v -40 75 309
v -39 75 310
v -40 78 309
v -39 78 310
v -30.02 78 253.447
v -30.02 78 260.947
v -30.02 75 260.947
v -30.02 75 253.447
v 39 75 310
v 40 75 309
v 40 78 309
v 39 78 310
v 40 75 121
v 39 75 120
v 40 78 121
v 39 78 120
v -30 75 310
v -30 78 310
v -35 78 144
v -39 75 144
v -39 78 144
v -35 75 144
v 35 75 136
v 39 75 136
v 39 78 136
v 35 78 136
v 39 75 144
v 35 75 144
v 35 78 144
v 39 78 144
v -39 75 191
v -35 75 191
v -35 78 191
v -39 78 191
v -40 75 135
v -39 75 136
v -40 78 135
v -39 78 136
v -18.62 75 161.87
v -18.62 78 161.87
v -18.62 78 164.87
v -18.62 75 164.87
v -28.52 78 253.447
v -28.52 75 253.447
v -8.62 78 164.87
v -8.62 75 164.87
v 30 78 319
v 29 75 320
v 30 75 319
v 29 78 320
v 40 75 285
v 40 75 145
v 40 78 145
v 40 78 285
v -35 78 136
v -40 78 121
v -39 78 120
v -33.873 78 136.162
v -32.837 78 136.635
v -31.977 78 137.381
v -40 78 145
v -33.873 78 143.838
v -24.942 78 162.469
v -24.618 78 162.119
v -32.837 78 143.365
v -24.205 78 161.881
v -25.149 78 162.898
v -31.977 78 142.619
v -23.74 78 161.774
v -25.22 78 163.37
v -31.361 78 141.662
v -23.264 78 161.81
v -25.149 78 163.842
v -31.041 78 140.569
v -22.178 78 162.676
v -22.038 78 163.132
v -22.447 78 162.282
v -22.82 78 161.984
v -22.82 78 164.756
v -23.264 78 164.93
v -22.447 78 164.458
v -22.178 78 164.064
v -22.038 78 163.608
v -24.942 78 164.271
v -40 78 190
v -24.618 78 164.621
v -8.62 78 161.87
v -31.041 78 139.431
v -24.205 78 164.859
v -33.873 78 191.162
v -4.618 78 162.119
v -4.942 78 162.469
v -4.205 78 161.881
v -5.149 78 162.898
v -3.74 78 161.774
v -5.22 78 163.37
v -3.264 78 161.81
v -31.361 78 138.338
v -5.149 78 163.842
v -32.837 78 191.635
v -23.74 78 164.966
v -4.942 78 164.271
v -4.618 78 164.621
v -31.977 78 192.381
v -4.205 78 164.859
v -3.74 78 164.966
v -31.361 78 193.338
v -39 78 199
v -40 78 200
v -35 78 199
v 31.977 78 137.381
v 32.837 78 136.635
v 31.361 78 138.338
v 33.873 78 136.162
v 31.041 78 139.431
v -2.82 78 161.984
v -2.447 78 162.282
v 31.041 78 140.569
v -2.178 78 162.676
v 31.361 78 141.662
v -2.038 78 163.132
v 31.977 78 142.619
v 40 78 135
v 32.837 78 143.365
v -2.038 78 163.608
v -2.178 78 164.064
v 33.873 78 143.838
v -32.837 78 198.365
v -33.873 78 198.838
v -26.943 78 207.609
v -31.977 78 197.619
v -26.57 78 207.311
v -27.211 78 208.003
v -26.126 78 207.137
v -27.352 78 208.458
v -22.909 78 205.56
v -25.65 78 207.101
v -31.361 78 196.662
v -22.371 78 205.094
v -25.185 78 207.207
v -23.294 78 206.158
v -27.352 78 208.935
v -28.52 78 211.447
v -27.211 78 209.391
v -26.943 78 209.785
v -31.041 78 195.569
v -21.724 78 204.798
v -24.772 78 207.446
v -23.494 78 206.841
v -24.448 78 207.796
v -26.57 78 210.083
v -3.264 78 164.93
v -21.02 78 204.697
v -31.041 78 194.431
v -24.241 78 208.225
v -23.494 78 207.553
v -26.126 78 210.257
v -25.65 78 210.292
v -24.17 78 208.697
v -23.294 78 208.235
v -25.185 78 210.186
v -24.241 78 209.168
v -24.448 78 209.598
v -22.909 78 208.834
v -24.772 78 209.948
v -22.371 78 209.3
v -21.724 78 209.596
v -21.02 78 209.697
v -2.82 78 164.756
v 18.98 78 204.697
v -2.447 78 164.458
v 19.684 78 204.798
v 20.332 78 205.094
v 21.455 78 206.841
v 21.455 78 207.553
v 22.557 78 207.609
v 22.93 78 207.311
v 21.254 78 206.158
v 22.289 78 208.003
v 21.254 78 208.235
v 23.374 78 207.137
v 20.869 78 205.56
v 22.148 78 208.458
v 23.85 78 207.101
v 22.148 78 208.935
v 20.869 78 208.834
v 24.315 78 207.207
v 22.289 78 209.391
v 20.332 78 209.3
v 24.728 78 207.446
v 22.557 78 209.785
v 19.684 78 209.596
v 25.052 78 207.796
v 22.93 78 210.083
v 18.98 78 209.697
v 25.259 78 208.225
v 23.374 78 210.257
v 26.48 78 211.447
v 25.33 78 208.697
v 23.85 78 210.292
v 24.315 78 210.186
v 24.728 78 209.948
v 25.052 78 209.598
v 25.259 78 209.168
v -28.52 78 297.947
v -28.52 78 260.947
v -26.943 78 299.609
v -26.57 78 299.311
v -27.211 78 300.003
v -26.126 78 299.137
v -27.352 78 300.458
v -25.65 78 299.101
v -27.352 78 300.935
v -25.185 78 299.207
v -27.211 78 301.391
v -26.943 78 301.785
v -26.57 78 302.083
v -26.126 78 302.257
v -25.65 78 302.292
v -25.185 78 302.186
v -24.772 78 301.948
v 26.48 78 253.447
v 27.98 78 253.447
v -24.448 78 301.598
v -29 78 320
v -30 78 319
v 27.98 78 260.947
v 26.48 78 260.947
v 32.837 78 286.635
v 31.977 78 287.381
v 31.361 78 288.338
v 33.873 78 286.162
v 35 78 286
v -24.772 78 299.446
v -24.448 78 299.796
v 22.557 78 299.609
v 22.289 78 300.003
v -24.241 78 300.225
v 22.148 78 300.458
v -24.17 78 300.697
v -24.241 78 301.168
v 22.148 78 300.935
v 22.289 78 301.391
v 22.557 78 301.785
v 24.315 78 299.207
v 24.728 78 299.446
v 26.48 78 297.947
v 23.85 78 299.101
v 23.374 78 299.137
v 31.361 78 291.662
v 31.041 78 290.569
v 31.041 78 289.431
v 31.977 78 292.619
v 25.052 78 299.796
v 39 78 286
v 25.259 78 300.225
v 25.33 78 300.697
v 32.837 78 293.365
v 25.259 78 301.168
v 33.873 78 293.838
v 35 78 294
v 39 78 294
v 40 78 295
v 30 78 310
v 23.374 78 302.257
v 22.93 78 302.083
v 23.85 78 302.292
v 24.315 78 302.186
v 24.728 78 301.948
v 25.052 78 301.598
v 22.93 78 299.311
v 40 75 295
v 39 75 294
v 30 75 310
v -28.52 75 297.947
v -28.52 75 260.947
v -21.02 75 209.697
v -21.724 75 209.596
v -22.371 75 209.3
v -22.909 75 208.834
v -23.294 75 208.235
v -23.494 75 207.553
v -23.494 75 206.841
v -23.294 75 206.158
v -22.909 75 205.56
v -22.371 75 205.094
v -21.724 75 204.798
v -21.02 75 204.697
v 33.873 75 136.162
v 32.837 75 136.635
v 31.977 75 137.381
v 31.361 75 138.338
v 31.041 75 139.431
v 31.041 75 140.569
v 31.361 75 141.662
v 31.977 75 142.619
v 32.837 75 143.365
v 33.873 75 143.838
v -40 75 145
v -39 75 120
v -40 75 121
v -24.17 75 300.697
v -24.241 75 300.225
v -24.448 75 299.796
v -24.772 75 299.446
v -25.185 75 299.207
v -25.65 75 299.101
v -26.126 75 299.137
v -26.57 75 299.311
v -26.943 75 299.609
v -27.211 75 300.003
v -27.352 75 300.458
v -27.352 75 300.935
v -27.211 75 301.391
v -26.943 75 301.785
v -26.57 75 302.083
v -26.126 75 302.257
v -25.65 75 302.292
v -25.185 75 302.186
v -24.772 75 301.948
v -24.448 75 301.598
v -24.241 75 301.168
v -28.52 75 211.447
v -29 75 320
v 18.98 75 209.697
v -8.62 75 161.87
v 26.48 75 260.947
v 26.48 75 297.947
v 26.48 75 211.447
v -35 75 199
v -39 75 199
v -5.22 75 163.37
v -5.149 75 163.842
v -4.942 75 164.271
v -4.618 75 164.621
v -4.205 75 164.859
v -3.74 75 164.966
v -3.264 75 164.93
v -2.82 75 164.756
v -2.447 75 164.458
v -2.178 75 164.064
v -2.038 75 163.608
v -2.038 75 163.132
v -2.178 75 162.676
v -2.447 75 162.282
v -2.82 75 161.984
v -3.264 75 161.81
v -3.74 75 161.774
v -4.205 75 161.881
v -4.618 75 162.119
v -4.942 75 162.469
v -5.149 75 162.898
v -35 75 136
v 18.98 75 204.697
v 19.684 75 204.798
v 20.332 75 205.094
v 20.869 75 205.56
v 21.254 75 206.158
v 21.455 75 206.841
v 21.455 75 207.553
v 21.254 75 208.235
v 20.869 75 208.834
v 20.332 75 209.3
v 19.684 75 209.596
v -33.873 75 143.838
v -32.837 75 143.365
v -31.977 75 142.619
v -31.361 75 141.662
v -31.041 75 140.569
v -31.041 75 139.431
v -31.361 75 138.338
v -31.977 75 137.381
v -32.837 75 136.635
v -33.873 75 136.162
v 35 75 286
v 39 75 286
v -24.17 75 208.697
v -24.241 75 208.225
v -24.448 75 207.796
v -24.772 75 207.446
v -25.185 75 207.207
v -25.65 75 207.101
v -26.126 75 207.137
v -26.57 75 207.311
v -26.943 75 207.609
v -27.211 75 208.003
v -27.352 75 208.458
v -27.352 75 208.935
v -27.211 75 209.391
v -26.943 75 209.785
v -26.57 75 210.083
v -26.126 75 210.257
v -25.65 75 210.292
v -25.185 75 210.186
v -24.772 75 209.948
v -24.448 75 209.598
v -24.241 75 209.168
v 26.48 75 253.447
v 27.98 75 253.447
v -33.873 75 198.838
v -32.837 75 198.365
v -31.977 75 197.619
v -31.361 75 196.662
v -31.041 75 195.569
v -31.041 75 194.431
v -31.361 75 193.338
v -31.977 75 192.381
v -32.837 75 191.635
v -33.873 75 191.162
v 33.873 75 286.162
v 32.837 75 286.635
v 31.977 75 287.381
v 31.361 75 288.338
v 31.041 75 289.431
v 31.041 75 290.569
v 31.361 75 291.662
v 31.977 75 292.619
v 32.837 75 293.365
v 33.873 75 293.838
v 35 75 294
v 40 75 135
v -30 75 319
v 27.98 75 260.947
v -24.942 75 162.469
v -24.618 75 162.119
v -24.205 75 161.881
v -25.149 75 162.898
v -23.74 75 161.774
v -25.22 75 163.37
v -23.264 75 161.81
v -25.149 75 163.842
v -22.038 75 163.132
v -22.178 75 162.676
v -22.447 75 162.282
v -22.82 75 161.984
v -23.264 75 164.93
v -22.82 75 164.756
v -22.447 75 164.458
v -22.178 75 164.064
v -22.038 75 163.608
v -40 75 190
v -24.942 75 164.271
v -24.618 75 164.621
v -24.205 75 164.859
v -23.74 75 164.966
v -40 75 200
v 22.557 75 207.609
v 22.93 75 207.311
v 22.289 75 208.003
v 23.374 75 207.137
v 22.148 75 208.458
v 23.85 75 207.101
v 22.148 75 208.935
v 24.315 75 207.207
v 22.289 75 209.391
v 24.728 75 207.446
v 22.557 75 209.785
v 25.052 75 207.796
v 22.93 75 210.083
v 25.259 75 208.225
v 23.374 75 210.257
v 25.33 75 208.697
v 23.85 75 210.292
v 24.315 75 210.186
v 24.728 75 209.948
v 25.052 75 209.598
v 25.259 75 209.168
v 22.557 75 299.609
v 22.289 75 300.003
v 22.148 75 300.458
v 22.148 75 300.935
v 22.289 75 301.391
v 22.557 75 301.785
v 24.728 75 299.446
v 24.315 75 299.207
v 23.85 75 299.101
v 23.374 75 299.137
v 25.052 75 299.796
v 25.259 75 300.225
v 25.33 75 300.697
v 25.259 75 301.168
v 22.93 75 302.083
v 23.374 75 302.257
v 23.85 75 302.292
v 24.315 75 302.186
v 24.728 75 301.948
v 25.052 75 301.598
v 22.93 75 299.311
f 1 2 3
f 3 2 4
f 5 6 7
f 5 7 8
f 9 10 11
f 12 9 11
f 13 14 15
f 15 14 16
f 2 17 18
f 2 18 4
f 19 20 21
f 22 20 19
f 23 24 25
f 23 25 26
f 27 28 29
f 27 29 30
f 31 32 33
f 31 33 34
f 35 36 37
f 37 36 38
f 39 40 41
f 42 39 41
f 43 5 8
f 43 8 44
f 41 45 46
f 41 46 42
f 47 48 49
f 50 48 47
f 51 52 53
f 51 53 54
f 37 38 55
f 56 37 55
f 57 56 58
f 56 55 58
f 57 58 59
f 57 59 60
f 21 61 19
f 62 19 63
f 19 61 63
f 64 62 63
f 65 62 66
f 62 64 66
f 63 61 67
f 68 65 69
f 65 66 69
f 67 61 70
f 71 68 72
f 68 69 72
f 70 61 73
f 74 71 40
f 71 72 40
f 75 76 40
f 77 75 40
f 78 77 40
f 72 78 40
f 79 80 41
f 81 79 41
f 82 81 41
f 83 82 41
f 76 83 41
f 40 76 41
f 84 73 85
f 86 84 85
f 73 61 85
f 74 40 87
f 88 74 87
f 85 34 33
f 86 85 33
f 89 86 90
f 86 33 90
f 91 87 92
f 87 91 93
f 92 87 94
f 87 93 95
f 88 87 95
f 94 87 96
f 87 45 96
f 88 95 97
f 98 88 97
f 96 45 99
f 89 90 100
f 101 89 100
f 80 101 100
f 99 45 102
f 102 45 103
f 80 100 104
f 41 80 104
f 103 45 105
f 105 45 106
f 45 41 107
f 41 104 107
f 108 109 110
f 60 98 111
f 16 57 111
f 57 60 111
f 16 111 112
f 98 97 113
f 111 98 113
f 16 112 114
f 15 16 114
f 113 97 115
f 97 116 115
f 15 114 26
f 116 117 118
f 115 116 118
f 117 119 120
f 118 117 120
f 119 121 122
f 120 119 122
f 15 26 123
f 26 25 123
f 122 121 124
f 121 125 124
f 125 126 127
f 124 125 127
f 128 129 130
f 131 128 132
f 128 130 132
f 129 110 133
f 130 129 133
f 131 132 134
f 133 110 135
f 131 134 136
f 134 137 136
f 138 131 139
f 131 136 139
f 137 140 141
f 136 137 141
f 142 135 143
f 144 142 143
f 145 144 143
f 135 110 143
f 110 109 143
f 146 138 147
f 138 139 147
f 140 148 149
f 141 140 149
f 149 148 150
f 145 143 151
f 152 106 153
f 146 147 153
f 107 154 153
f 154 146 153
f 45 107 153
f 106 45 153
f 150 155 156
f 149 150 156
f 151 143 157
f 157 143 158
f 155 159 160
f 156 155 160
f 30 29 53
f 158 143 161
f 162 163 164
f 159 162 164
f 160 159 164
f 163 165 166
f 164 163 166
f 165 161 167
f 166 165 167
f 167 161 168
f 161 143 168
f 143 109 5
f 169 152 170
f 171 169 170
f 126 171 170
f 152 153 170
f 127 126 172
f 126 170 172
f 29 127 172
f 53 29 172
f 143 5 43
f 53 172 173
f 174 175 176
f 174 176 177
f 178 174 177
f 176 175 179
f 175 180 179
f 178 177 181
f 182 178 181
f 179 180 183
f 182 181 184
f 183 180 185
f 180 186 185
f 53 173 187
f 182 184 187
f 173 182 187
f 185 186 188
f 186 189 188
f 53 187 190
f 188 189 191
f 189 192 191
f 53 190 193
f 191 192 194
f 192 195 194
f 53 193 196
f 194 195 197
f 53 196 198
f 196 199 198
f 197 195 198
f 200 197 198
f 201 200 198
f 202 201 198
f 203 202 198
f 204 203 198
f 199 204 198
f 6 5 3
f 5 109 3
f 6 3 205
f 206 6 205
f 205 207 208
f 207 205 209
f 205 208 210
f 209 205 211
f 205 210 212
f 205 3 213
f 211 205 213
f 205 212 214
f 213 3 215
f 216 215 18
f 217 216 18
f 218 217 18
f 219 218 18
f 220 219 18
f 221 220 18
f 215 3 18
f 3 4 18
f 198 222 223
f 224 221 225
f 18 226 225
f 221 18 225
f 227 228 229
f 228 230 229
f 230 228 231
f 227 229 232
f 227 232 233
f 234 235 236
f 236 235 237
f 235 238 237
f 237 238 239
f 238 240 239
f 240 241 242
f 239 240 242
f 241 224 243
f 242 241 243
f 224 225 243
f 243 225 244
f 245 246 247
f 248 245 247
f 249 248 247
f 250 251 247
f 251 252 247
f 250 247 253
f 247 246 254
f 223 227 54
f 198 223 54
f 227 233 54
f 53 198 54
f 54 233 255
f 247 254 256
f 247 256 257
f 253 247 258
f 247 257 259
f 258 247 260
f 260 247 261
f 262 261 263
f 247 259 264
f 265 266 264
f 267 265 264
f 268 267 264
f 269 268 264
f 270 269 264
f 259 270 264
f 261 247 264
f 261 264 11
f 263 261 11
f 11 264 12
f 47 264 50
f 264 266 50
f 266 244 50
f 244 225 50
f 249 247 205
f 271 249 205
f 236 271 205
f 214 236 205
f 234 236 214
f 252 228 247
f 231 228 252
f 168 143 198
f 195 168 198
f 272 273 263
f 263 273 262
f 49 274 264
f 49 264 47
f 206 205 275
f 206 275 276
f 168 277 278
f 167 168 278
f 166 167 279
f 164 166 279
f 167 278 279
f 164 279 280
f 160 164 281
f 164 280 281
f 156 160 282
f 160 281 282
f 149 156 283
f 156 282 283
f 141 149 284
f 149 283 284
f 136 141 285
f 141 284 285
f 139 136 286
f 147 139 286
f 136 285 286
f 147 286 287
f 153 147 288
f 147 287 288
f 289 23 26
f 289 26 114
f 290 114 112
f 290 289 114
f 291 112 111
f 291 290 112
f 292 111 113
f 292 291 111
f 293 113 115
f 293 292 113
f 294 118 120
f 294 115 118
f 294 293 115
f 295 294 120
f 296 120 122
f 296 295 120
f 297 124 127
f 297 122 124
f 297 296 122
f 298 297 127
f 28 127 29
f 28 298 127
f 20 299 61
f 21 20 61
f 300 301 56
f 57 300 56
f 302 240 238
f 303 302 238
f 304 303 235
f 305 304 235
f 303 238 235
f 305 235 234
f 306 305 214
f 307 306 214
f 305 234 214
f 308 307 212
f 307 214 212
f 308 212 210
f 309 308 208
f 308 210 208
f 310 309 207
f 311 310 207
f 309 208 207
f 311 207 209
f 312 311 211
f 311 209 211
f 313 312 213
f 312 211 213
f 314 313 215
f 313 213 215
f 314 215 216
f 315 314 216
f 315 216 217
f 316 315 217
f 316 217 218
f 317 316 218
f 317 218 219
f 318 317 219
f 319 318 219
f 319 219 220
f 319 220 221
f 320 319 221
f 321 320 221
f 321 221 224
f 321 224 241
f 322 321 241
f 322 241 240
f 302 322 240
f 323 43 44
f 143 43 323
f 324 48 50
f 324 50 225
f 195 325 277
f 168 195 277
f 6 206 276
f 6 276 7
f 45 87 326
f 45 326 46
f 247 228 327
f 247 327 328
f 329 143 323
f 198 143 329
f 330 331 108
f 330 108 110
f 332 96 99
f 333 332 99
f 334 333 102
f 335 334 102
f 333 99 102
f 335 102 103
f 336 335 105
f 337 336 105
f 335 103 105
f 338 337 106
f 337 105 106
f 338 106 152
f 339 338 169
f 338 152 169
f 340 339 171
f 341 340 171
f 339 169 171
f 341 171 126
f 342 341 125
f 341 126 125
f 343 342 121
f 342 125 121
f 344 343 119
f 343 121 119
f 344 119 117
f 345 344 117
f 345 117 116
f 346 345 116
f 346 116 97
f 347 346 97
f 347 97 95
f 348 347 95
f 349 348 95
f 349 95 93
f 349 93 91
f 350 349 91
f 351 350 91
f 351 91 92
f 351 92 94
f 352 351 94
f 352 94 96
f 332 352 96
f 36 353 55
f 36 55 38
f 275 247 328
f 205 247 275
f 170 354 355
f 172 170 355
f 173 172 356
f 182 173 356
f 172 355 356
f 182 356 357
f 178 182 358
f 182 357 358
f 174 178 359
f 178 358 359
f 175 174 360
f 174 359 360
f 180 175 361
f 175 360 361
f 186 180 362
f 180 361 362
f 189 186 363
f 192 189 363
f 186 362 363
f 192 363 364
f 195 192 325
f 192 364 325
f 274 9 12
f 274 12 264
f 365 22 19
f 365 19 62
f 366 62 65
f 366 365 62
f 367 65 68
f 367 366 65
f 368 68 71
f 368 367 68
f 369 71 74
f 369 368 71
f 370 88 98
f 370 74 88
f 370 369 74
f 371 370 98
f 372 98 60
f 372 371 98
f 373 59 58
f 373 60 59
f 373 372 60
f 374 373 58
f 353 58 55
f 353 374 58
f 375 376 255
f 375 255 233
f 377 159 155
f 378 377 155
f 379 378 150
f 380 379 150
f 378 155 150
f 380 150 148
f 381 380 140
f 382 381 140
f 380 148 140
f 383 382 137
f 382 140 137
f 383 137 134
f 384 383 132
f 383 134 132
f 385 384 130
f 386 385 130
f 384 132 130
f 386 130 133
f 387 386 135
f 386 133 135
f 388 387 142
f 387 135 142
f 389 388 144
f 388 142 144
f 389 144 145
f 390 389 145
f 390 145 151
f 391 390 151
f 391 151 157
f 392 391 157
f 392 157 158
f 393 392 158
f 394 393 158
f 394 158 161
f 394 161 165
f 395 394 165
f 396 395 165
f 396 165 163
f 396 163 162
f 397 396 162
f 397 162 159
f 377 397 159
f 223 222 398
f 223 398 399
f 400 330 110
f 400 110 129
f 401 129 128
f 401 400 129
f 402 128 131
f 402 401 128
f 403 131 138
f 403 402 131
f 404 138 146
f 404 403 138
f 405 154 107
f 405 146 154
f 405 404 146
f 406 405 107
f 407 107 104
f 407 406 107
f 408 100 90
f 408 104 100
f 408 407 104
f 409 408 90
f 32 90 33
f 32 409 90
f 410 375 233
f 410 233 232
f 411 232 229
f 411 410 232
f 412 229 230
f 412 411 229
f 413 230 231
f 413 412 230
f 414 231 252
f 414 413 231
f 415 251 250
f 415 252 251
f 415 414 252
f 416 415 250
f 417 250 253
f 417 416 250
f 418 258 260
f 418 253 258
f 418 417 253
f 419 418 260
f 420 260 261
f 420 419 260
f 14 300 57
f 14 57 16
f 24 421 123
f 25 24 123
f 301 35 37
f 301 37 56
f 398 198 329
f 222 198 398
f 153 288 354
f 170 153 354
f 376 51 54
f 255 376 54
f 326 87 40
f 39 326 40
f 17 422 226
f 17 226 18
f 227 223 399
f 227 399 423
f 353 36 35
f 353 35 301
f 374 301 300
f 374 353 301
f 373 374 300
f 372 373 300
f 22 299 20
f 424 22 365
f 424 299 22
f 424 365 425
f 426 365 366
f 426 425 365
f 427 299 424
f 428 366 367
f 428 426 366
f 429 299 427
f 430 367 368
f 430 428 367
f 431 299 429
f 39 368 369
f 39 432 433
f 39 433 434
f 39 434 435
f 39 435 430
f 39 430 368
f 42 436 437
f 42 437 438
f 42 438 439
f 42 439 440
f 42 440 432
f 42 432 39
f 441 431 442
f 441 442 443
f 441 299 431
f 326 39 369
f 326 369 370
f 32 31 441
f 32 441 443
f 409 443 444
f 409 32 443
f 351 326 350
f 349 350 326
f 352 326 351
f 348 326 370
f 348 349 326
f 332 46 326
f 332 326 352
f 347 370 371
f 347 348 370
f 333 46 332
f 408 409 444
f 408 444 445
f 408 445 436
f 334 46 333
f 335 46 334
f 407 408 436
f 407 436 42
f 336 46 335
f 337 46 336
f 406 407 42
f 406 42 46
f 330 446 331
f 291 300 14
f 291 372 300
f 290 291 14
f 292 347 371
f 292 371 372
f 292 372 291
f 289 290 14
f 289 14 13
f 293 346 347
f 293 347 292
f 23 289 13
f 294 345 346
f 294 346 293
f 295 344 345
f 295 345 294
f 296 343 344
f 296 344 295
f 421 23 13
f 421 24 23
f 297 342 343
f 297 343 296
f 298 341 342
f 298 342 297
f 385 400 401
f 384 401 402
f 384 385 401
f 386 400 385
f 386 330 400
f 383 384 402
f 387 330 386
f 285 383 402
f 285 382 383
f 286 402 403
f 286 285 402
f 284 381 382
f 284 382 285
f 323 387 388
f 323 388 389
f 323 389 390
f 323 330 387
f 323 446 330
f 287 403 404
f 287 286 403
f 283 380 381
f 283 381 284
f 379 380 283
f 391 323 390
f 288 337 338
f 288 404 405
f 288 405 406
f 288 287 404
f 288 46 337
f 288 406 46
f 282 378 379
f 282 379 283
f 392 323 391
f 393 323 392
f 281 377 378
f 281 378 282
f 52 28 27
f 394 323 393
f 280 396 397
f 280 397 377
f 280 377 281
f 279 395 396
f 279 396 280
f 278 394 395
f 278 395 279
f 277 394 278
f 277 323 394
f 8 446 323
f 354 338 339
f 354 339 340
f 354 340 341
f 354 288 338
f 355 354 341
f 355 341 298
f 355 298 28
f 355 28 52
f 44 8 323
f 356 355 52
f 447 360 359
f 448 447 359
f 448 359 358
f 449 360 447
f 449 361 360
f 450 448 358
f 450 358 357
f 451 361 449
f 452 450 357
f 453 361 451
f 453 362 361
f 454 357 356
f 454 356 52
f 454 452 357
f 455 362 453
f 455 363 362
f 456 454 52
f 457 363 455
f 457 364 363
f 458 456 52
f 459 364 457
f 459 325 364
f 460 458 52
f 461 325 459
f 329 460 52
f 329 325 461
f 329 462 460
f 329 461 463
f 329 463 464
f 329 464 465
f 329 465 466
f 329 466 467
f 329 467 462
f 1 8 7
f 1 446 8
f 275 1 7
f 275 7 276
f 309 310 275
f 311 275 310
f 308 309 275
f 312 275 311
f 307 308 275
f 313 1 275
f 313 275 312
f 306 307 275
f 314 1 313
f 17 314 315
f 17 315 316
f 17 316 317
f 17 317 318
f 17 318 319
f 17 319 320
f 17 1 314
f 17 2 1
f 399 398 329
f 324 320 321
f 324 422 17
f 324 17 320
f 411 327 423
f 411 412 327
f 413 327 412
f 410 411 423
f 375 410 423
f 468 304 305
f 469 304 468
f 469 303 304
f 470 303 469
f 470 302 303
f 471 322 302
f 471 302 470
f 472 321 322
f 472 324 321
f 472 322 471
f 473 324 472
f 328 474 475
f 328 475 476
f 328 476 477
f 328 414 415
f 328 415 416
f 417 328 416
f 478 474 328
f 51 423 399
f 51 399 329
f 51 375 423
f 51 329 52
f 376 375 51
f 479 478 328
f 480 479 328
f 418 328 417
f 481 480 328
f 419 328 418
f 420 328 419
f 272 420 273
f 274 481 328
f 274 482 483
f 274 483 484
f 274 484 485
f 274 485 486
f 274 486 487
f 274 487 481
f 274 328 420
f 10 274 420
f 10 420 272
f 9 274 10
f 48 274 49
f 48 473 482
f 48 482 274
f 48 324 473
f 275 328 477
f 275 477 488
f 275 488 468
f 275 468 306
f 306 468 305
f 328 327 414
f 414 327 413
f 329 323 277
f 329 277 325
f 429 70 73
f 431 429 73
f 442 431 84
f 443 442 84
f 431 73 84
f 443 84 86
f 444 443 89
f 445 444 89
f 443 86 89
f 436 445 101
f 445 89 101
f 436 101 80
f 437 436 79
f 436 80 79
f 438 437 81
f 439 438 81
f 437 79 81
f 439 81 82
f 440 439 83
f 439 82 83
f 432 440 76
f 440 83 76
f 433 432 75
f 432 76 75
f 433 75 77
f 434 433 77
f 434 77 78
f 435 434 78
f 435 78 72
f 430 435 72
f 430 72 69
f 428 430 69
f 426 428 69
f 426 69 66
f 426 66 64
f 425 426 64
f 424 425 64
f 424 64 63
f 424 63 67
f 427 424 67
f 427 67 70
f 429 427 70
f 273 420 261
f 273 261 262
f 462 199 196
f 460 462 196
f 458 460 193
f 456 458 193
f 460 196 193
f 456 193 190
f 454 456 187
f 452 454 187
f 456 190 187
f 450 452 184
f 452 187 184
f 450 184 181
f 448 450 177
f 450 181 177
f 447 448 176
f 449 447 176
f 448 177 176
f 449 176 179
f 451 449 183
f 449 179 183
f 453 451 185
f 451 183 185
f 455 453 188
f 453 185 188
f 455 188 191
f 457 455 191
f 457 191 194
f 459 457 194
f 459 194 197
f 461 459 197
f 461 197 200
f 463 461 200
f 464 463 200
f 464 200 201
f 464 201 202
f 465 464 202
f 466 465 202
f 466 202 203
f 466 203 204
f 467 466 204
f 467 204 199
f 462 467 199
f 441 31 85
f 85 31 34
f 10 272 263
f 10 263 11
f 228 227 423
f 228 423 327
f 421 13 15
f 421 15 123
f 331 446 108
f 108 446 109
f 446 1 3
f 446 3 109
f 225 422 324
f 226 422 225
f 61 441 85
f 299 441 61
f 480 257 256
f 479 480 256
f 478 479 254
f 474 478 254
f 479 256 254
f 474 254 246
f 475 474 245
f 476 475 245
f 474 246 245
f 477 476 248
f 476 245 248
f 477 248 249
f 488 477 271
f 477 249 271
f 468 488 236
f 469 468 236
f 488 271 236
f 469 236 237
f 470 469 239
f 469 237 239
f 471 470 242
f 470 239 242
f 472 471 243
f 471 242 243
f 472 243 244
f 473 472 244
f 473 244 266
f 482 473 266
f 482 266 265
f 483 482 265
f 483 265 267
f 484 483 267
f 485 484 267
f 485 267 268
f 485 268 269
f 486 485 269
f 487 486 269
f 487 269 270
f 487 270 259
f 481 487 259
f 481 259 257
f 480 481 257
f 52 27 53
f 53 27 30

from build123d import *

# Parameters (mm, degrees)
PAD087_DEPTH    = 3
POCKET016_DEPTH = 3.001
CHAMFER060_SIZE = 1
SKETCH179_R     = 1.6
POCKET025_DEPTH = 3.001
SKETCH180_R     = 1.6
SKETCH180_W     = 10
SKETCH180_H     = 3
POCKET026_DEPTH = 3.001
POCKET027_DEPTH = 3.001


with BuildPart() as part:
    # Sketch160 → Pad087 (new body)
    with BuildSketch(Plane(origin=(0, 0, 0), x_dir=(-1, 0, 0), z_dir=(0, 1, 0))):
        Polygon((-40, 310), (-30, 310), (-30, 320), (30, 320), (30, 310), (40, 310), (40, 120), (-40, 120), align=None)
    extrude(amount=PAD087_DEPTH)

    # Sketch161 → Pocket016 (cut, through all)
    with BuildSketch(Plane(origin=(0, 0, 0), x_dir=(-1, 0, 0), z_dir=(0, 1, 0))):
        with BuildLine():
            ThreePointArc((-40, 294), (-44, 290), (-40, 286))
            Line((-40, 286), (-35, 286))
            ThreePointArc((-35, 286), (-31, 290), (-35, 294))
            Line((-35, 294), (-40, 294))
        make_face()
        with BuildLine():
            ThreePointArc((-40, 144), (-44, 140), (-40, 136))
            Line((-40, 136), (-35, 136))
            ThreePointArc((-35, 136), (-31, 140), (-35, 144))
            Line((-35, 144), (-40, 144))
        make_face()
        with BuildLine():
            ThreePointArc((40, 136), (44, 140), (40, 144))
            Line((40, 144), (35, 144))
            ThreePointArc((35, 144), (31, 140), (35, 136))
            Line((35, 136), (40, 136))
        make_face()
        with BuildLine():
            ThreePointArc((40, 191), (44, 195), (40, 199))
            Line((40, 199), (35, 199))
            ThreePointArc((35, 199), (31, 195), (35, 191))
            Line((35, 191), (40, 191))
        make_face()
    extrude(amount=POCKET016_DEPTH, mode=Mode.SUBTRACT)

    # Chamfer060
    chamfer060_edges = [part.edges().sort_by_distance(p)[0] for p in [
        (40, 1.5, 310),
        (30, 1.5, 320),
        (40, 1.5, 294),
        (40, 1.5, 286),
        (-40, 1.5, 310),
        (-30, 1.5, 320),
        (40, 1.5, 144),
        (40, 1.5, 136),
        (40, 1.5, 120),
        (-40, 1.5, 120),
        (-40, 1.5, 136),
        (-40, 1.5, 144),
        (-40, 1.5, 191),
        (-40, 1.5, 199),
    ]]
    chamfer(chamfer060_edges, length=CHAMFER060_SIZE)

    # Sketch179 (on Face5 of Chamfer060) → Pocket025 (cut, through all)
    with BuildSketch(Plane(origin=(0, 3, 0), x_dir=(1, 0, 0), z_dir=(0, 1, 0))):
        with Locations((-25.769897, -208.69686)):
            Circle(SKETCH179_R)
        with Locations((23.730103, -208.69686)):
            Circle(SKETCH179_R)
        with Locations((23.730103, -300.69686)):
            Circle(SKETCH179_R)
        with Locations((-25.769897, -300.69686)):
            Circle(SKETCH179_R)
        Polygon((26.480103, -297.94686), (-28.519897, -297.94686), (-28.519897, -260.94686), (-30.019897, -260.94686), (-30.019897, -253.44686), (-28.519897, -253.44686), (-28.519897, -211.44686), (26.480103, -211.44686), (26.480103, -253.44686), (27.980103, -253.44686), (27.980103, -260.94686), (26.480103, -260.94686), align=None)
    extrude(amount=-POCKET025_DEPTH, mode=Mode.SUBTRACT)

    # Sketch180 (on Face5 of Pocket025) → Pocket026 (cut, through all)
    with BuildSketch(Plane(origin=(0, 3, 0), x_dir=(-1, 0, 0), z_dir=(0, 1, 0))):
        with Locations((23.62, 163.37)):
            Circle(SKETCH180_R)
        with Locations((3.62, 163.37)):
            Circle(SKETCH180_R)
        with Locations((13.62, 163.37)):
            Rectangle(SKETCH180_W, SKETCH180_H)
    extrude(amount=-POCKET026_DEPTH, mode=Mode.SUBTRACT)

    # Sketch182 → Pocket027 (cut, through all)
    with BuildSketch(Plane.XZ):
        with BuildLine():
            ThreePointArc((-21.019897, 209.69686), (-23.519897, 207.19686), (-21.019897, 204.69686))
            Line((-21.019897, 204.69686), (18.980103, 204.69686))
            ThreePointArc((18.980103, 204.69686), (21.480103, 207.19686), (18.980103, 209.69686))
            Line((18.980103, 209.69686), (-21.019897, 209.69686))
        make_face()
    extrude(amount=-POCKET027_DEPTH, mode=Mode.SUBTRACT)


with BuildPart() as part_1:
    # Body076 placement: moved
    add(part.part.moved(Location((0, 75, 0))))


solid = part_1.part
